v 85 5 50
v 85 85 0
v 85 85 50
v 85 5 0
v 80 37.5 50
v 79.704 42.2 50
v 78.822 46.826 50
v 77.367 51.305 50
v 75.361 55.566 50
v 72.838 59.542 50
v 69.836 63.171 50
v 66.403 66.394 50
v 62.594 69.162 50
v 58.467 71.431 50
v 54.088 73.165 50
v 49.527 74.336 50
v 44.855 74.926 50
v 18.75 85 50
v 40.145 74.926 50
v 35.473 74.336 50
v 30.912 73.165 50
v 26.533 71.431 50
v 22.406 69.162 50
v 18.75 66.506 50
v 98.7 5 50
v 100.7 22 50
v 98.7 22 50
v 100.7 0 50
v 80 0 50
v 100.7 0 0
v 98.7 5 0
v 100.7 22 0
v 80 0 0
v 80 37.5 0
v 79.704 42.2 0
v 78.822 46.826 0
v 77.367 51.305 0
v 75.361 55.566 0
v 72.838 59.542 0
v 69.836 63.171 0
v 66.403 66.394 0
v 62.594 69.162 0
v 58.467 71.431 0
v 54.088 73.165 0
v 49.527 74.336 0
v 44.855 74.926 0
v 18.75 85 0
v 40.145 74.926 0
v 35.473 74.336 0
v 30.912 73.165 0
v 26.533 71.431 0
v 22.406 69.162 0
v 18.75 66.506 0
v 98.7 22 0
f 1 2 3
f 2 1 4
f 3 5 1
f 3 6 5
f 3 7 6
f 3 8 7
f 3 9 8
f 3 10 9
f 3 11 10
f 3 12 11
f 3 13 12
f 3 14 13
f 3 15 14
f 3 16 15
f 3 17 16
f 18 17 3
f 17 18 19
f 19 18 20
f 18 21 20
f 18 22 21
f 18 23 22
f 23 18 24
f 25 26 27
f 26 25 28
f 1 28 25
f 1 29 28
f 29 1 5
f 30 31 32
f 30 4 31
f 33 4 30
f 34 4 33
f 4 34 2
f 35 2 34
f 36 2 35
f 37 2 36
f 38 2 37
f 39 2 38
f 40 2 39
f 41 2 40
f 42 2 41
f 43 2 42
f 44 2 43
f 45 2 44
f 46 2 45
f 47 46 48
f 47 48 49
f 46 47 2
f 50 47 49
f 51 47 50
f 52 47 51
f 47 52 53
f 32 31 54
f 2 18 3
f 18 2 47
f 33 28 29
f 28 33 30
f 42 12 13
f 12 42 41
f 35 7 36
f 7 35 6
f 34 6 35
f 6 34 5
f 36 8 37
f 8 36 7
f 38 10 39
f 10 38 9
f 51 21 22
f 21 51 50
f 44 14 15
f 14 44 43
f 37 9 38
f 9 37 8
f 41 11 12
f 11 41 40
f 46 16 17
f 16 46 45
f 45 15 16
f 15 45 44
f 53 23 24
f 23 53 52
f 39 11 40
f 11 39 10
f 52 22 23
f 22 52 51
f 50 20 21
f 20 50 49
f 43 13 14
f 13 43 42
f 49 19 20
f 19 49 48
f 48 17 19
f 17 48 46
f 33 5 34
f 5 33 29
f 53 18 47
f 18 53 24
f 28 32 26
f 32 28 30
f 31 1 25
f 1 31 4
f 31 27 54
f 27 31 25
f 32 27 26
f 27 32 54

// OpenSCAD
roll_diameter = 75;
roll_width = 50;
door_width = 13.7;
strength = 5;
inner_strength = 2;
inner_height = 12;

$fn=50;

difference(){
    cube([roll_diameter +2*strength , roll_diameter + 2*strength, roll_width]);
    
    translate([roll_diameter/2+strength, roll_diameter/2, -2*strength]) cylinder(r=roll_diameter/2, h=100);
    
    translate([-0.1,-0.1,-2*strength]) cube([roll_diameter/2+0.1, roll_diameter -2*strength+0.3, 100]);
    
    translate([-0.1,-0.1,-2*strength]) cube([roll_diameter+strength+0.1,roll_diameter/2+0.1,100]);
    
    translate([-0.1,roll_diameter-2*strength+0.1,-0.1]) cube([roll_diameter/4+0.1,5*strength+0.1,roll_width*2]);
}
translate([roll_diameter+2*strength,0,0]) cube([door_width + inner_strength, strength, roll_width]);

translate([roll_diameter+2*strength+door_width,strength,0]) 
cube([inner_strength, inner_height+strength, roll_width]);
